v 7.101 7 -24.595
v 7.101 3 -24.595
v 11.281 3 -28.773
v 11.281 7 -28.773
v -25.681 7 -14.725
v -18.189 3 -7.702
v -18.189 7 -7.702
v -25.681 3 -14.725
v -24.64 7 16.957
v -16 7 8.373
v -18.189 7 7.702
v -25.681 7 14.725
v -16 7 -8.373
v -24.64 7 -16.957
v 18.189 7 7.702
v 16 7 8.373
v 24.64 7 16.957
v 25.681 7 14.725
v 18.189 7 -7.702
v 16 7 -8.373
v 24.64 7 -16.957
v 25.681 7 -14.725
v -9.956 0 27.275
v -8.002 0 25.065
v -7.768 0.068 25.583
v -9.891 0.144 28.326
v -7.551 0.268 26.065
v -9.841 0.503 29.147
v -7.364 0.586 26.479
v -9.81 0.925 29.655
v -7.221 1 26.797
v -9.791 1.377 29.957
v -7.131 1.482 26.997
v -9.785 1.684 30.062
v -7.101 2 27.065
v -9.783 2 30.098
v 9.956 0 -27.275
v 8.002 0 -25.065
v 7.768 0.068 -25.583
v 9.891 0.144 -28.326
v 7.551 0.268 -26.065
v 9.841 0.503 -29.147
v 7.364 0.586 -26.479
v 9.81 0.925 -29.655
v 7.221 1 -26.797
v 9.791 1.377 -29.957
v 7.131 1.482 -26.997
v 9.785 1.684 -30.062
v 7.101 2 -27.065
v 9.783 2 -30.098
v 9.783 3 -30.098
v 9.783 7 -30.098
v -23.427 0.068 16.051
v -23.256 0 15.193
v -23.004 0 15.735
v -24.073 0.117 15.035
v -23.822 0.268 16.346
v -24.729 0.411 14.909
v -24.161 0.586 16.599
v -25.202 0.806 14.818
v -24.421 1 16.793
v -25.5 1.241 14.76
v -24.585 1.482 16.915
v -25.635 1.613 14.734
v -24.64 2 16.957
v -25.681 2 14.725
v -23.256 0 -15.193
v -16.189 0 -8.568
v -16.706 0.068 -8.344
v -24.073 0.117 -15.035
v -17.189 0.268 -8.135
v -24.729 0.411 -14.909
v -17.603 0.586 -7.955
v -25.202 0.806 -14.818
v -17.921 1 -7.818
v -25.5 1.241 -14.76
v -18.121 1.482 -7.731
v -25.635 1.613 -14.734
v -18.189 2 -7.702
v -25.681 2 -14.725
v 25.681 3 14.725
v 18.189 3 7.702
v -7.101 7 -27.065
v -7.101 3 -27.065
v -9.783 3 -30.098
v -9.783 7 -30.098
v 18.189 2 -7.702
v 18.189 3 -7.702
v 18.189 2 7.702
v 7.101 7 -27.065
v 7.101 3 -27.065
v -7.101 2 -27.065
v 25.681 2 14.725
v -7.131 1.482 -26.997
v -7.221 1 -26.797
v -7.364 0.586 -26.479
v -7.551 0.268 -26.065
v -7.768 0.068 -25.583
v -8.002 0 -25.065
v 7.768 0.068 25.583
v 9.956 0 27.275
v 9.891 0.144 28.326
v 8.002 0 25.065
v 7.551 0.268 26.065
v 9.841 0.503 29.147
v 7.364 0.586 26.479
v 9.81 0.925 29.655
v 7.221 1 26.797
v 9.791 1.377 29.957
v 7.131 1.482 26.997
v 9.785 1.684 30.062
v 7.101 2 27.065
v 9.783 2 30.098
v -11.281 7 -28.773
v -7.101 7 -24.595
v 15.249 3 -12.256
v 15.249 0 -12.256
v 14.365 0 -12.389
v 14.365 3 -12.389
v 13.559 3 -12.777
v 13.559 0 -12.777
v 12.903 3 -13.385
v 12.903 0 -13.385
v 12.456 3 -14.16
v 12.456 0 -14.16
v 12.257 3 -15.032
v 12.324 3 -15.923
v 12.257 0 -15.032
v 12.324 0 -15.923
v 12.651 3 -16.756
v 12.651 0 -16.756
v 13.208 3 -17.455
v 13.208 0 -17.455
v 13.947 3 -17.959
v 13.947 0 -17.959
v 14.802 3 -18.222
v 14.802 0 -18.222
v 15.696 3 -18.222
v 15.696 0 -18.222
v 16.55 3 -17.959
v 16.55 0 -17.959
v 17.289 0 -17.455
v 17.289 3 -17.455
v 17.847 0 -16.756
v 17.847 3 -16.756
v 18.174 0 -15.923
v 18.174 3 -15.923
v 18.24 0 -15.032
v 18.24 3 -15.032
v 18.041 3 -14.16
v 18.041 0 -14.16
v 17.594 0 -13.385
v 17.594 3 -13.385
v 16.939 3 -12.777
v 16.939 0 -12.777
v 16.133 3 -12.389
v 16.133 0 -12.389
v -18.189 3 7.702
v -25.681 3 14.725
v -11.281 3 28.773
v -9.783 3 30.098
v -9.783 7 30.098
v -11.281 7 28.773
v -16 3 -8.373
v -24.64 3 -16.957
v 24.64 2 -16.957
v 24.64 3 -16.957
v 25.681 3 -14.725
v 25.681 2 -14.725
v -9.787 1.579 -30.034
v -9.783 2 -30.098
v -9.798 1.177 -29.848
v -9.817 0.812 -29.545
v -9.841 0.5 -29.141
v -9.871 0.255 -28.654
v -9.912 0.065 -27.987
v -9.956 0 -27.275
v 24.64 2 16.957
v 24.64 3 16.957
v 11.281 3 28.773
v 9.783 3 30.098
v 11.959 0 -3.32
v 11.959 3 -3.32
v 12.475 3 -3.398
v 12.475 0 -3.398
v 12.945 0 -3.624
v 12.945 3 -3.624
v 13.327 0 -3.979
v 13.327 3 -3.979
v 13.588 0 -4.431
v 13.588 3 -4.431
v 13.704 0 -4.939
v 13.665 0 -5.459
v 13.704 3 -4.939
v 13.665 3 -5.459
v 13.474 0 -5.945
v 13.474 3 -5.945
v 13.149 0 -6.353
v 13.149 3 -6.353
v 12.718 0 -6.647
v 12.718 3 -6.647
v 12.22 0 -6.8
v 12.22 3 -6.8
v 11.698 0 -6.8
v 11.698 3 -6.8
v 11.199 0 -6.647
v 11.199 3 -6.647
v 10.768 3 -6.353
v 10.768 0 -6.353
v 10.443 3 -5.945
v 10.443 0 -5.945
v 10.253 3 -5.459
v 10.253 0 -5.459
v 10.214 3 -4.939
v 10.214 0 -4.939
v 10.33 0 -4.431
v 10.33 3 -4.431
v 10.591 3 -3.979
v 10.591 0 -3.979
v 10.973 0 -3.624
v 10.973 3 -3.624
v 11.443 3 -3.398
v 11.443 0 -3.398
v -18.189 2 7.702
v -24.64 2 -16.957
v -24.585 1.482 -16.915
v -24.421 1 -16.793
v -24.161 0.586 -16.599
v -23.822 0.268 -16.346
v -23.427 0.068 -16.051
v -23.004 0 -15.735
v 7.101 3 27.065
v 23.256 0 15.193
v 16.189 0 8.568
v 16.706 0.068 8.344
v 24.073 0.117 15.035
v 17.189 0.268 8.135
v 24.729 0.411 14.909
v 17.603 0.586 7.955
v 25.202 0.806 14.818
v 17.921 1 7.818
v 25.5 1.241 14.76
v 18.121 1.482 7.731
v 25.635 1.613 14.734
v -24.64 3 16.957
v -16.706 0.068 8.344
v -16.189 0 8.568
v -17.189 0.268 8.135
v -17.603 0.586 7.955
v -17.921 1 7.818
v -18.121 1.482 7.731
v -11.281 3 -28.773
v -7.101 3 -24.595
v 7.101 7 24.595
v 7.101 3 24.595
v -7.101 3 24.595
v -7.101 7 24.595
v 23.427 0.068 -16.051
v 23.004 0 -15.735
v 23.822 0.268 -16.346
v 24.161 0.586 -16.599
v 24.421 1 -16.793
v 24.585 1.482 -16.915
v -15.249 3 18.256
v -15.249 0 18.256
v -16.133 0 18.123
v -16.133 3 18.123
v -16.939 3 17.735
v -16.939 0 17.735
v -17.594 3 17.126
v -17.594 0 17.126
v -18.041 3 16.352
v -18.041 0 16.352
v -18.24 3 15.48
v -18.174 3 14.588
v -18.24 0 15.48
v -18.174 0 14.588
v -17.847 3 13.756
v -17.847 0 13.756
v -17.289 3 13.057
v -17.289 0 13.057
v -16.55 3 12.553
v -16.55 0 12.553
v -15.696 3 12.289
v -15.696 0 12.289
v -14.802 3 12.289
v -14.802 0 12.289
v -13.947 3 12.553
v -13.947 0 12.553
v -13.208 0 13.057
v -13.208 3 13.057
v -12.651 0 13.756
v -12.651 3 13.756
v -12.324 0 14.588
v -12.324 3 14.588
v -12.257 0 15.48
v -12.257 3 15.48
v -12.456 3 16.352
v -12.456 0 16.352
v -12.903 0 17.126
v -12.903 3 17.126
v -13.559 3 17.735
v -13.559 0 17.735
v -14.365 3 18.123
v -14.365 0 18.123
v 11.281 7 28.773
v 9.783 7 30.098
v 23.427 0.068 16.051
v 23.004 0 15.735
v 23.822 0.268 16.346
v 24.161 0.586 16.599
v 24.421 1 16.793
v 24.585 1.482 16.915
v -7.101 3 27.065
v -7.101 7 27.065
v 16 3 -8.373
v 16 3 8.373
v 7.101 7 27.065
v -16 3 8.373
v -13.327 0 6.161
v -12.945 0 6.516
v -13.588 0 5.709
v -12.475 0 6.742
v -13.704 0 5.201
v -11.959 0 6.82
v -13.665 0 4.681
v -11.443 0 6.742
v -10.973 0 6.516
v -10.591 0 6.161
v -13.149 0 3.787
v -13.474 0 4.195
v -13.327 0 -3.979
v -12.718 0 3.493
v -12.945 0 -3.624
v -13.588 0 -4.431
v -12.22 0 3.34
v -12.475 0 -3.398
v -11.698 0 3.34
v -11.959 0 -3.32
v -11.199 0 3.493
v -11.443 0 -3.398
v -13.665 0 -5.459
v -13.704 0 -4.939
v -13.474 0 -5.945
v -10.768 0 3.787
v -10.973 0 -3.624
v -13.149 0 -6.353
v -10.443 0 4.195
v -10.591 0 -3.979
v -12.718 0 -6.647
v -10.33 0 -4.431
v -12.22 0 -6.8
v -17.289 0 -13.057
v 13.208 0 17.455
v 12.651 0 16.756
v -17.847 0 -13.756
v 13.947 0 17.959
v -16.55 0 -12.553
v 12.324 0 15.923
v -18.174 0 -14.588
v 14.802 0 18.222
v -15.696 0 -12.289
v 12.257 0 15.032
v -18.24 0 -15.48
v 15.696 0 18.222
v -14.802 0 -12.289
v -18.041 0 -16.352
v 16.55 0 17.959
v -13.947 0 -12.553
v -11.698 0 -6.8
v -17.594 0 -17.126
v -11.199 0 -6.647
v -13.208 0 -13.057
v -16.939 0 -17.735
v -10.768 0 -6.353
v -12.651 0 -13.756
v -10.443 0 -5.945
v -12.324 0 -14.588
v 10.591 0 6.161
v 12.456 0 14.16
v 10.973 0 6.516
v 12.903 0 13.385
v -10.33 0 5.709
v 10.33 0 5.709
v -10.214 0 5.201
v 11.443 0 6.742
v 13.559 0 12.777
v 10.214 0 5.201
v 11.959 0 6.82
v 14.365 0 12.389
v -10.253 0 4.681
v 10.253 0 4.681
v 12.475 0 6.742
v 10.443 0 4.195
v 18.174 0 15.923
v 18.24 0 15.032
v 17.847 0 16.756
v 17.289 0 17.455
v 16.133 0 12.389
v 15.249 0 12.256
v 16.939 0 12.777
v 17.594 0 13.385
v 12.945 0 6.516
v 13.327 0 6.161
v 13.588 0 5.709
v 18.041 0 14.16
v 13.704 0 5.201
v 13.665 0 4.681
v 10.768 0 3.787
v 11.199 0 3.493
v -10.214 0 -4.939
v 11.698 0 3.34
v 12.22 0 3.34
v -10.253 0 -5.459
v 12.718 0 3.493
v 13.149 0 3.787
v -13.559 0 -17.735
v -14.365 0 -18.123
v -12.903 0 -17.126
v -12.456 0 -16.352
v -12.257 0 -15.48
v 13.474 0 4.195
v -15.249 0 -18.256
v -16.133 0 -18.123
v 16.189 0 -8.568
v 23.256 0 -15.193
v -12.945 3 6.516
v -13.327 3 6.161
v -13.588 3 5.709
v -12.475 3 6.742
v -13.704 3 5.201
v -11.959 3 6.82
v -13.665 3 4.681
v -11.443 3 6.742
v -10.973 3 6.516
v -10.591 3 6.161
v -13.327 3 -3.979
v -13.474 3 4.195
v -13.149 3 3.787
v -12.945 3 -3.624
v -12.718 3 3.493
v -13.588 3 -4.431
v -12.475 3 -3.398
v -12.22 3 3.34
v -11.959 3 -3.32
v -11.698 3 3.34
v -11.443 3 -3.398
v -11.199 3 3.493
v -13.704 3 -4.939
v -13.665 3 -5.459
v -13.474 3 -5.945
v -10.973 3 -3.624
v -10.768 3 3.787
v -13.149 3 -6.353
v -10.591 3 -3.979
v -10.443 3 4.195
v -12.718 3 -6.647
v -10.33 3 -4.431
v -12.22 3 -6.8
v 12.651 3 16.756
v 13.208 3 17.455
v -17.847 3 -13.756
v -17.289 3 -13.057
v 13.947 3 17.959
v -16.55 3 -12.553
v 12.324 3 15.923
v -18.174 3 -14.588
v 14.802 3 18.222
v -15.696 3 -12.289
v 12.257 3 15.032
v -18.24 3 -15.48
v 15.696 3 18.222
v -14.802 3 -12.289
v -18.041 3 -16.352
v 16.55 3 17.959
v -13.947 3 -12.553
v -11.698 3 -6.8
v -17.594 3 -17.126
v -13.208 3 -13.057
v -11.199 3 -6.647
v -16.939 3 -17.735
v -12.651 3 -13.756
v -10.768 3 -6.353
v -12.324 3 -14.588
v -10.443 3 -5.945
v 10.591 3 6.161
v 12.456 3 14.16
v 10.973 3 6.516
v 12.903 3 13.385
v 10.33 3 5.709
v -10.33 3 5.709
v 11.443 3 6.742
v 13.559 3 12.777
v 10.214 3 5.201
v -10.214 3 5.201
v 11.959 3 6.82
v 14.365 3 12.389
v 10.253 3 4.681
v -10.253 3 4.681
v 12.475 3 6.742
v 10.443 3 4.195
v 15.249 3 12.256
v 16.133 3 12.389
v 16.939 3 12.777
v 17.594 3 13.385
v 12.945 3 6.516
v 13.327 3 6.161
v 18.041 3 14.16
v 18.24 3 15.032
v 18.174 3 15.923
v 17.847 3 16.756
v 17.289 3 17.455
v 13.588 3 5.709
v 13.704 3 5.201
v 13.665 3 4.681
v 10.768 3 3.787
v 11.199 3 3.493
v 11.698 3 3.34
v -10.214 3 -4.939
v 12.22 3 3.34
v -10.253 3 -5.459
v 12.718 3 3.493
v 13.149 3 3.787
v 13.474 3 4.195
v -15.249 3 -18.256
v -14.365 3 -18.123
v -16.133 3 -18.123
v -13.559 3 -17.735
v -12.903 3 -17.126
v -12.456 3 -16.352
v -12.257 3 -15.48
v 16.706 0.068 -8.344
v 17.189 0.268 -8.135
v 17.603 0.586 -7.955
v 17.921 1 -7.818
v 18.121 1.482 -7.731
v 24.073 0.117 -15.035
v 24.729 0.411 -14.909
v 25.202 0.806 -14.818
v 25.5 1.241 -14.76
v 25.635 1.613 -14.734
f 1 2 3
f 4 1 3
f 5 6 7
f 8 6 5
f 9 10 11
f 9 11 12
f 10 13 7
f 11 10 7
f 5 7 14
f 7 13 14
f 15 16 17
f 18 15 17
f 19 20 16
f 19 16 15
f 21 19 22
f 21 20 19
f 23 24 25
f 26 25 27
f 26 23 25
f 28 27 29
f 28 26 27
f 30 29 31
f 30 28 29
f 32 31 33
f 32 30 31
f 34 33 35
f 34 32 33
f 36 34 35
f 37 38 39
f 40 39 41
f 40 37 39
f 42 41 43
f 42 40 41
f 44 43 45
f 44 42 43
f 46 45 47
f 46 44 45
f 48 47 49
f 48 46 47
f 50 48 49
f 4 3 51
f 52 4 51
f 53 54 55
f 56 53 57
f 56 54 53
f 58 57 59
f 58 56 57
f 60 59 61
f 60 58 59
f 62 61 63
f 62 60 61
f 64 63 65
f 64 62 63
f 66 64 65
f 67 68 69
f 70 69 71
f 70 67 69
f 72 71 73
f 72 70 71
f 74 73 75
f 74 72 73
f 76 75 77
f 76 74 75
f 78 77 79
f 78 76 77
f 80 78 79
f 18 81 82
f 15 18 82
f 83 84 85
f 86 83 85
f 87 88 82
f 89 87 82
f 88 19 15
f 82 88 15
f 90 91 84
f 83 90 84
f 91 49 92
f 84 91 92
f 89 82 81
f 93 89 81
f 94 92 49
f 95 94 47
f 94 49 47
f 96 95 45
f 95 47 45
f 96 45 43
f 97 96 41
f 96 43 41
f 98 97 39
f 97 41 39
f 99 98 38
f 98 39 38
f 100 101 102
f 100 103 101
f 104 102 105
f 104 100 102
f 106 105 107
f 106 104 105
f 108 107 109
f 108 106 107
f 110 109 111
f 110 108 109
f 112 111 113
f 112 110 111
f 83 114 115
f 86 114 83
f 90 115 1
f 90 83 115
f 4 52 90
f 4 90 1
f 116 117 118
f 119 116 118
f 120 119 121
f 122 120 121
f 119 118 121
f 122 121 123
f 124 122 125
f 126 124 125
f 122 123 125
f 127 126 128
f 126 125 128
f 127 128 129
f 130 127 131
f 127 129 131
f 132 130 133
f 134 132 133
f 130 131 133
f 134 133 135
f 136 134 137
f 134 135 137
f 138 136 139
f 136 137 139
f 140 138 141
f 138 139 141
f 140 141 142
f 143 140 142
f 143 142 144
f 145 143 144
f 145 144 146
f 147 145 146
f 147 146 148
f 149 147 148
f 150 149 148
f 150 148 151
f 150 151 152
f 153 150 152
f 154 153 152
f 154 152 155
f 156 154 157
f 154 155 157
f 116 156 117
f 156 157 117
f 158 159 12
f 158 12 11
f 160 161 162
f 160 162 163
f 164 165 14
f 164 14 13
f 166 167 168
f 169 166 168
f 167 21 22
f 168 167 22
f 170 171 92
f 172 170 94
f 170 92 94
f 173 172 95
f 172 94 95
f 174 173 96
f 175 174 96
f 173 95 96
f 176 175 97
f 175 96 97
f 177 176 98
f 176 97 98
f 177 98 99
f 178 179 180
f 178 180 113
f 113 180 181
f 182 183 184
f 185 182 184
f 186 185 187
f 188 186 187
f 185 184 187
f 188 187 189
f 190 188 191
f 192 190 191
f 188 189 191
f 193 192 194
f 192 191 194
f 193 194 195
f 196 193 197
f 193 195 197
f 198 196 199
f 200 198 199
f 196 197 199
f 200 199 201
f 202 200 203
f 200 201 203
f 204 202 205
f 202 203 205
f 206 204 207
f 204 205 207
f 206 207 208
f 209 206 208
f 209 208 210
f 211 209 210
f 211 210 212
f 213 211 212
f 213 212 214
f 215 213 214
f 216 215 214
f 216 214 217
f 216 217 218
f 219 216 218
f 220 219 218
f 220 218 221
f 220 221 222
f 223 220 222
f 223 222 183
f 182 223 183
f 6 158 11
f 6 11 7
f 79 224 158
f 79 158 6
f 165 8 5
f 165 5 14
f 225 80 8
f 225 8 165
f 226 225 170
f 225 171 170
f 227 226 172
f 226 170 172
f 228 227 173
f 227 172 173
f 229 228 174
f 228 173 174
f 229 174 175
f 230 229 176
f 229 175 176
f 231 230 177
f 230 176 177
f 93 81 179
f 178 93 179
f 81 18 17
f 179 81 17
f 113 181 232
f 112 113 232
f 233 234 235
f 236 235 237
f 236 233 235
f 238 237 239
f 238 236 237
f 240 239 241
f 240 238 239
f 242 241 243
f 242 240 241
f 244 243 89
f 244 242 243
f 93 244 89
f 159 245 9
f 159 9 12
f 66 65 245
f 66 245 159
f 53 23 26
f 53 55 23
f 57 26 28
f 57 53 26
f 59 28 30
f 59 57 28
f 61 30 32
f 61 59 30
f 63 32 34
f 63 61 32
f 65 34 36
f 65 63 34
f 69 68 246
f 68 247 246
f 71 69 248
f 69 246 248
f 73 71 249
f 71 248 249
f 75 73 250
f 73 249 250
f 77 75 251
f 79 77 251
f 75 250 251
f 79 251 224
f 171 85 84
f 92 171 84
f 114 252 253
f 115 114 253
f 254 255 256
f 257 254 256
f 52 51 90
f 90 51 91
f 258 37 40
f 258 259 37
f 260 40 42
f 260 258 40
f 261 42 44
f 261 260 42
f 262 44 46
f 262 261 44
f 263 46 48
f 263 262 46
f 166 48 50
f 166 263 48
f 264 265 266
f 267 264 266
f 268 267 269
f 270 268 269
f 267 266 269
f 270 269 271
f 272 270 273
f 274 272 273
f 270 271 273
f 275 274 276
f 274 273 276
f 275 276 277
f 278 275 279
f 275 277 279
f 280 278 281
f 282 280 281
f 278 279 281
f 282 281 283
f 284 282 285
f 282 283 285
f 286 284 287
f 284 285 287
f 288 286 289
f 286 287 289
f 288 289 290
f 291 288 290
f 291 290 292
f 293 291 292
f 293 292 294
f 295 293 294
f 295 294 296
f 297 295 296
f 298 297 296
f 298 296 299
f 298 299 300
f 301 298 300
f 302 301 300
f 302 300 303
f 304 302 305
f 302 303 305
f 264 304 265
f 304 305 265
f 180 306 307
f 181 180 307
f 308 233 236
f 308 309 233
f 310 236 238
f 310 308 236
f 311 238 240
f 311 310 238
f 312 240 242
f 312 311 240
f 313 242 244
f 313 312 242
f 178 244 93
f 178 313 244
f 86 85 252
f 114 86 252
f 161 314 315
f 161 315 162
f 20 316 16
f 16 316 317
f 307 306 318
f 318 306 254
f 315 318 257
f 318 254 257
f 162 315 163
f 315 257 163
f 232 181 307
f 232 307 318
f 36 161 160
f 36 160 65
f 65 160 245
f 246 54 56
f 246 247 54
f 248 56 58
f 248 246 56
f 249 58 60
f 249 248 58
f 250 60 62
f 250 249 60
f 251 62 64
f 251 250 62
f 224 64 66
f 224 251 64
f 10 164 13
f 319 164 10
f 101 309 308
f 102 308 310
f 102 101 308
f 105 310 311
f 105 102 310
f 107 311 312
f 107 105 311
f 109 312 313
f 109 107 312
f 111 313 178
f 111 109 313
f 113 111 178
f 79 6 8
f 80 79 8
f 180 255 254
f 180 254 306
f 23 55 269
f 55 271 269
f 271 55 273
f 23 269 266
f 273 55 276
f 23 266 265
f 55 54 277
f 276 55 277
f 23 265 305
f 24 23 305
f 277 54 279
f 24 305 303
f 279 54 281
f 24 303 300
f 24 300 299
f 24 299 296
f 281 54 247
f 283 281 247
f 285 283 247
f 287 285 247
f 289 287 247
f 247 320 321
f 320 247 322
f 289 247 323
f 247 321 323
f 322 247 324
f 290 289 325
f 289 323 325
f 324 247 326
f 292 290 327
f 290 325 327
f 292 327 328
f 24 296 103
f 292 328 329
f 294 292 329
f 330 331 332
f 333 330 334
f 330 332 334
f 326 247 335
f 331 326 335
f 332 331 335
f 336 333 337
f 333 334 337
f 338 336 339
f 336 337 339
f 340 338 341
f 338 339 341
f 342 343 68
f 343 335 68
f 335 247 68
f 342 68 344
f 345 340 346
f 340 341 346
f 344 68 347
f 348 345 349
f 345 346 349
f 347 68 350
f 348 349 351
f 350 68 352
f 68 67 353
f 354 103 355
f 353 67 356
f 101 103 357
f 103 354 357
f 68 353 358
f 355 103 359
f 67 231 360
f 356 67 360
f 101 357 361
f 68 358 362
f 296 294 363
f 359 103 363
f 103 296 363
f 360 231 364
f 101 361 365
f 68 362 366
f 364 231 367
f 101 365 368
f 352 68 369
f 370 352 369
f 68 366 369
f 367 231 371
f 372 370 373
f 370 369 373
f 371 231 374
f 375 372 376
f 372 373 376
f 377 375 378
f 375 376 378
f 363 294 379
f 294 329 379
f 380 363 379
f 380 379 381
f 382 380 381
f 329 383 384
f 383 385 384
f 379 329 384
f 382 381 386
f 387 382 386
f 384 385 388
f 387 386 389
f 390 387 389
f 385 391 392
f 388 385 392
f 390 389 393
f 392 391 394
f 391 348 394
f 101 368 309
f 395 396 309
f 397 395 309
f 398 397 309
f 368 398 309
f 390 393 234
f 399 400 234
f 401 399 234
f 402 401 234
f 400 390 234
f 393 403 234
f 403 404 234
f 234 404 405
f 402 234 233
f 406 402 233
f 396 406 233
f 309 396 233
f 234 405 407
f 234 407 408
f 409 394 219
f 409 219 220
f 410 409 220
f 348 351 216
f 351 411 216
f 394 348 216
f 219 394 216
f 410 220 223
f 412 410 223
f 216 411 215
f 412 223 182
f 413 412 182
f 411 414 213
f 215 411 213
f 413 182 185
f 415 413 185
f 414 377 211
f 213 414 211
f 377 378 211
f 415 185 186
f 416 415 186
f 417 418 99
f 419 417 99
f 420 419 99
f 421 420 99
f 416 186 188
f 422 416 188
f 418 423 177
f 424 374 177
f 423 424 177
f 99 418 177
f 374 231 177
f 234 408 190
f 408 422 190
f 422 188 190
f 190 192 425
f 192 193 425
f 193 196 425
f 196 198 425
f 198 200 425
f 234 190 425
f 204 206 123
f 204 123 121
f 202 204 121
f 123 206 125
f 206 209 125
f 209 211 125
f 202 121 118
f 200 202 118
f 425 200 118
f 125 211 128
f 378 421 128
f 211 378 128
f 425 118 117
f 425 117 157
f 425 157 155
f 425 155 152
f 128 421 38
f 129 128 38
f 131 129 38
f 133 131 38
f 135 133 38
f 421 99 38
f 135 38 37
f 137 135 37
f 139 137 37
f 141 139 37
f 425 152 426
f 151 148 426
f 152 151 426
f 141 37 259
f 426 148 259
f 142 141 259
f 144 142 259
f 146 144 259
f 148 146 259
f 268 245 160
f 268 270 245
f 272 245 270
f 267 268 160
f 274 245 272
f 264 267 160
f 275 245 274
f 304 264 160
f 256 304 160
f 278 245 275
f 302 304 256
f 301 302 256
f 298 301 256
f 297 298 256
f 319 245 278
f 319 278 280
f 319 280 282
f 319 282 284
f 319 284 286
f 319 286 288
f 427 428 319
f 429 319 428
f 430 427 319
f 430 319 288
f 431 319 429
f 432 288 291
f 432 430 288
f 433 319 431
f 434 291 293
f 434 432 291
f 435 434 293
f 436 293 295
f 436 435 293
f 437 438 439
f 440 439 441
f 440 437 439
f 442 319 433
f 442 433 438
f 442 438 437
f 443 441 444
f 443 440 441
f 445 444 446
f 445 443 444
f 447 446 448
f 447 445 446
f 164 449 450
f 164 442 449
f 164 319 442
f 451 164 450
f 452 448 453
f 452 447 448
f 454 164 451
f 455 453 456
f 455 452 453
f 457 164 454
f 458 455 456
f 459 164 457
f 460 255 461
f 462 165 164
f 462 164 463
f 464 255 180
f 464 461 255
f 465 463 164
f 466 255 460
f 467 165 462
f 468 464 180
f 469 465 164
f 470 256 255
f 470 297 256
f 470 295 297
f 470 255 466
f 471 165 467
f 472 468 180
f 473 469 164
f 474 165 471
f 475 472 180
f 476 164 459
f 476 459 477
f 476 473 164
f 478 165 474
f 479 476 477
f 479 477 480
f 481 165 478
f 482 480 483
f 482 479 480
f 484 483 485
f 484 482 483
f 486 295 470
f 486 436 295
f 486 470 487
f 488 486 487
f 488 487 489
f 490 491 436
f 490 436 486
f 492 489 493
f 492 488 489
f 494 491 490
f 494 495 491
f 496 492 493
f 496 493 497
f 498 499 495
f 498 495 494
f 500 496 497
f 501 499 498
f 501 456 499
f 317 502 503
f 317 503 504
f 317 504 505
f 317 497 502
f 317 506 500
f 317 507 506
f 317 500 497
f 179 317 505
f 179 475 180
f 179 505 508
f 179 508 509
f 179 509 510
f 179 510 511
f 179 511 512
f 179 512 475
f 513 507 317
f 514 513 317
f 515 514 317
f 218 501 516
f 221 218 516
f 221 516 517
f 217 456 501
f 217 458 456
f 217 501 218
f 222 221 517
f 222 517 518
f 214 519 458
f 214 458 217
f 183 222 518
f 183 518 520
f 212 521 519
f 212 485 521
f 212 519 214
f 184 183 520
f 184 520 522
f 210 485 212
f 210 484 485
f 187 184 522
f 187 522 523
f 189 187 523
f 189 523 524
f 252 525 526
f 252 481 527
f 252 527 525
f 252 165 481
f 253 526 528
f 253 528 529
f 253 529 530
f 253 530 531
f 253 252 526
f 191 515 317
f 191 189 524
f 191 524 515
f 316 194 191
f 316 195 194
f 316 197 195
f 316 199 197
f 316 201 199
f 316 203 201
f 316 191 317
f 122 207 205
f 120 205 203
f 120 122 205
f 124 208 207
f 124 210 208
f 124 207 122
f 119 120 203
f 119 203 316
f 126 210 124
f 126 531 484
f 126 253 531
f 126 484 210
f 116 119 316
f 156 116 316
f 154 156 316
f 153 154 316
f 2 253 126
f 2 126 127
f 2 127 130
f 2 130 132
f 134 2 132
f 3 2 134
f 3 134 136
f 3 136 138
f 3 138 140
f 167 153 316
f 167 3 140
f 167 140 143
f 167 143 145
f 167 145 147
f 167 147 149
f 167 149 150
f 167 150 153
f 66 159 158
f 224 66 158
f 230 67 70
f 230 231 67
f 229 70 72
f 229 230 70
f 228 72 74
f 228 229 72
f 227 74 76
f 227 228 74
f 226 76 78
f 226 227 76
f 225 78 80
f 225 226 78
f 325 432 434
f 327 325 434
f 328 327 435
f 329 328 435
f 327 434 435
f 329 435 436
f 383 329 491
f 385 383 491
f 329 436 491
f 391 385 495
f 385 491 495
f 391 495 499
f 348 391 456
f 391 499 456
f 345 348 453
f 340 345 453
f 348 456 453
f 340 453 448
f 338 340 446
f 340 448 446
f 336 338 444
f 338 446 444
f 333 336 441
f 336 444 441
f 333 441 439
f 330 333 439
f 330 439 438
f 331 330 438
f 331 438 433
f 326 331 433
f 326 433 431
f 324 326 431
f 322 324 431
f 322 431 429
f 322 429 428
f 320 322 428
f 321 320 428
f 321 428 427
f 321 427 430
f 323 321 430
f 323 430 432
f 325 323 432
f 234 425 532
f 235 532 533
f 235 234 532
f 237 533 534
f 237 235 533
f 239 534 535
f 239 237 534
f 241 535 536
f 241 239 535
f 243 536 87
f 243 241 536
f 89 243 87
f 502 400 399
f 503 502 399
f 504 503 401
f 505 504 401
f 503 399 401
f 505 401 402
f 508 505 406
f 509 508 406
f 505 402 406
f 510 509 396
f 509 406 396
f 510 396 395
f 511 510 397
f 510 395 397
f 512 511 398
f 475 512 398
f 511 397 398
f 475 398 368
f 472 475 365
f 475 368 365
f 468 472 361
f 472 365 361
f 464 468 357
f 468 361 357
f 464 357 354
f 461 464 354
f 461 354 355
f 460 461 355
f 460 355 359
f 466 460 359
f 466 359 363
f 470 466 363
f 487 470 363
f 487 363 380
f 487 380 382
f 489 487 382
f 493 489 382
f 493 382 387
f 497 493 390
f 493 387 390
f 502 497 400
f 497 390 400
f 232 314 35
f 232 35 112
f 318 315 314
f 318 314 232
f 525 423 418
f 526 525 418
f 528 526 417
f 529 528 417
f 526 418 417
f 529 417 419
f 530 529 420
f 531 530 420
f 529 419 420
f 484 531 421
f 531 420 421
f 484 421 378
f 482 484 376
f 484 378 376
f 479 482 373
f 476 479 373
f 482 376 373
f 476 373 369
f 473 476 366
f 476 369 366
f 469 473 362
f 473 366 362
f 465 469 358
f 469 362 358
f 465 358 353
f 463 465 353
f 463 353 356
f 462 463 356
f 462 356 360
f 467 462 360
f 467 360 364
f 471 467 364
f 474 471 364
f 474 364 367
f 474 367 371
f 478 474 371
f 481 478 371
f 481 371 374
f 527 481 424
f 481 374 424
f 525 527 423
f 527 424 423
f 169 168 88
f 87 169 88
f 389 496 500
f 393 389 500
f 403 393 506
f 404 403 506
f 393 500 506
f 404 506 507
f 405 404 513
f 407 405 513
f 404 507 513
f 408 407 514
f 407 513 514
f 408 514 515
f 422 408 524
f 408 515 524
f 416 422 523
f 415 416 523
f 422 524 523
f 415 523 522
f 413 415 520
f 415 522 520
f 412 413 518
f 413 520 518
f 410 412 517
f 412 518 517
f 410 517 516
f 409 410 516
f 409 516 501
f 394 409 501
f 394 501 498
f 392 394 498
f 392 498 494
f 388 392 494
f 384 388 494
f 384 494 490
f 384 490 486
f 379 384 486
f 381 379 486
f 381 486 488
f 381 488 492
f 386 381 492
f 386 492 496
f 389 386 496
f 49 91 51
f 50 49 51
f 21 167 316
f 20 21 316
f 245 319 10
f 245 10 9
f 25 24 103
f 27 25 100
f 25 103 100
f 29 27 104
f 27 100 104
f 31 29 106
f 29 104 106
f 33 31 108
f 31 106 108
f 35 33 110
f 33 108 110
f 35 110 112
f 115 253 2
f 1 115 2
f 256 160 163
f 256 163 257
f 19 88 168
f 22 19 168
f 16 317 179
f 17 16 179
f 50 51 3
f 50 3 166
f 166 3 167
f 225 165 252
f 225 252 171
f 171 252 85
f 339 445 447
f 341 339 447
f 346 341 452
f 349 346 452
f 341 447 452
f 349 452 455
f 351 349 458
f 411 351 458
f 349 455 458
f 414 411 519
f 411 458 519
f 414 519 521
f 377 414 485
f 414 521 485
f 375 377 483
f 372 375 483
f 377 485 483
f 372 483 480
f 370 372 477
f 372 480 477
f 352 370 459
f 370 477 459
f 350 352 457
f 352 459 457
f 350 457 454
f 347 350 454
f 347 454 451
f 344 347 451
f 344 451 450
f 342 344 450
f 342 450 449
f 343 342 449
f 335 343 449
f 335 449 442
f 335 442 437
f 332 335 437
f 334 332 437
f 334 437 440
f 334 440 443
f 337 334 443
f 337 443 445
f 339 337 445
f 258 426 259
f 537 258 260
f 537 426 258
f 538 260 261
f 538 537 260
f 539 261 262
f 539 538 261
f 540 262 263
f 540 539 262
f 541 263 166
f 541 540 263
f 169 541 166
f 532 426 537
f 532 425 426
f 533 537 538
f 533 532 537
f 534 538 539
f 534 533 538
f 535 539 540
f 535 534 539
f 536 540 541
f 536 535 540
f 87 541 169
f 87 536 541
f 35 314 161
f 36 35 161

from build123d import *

# Parameters (mm, degrees)
SKETCH1_W           = 55
SKETCH1_H           = 64.43
BOSS_EXTRUDE1_DEPTH = 3
CUT_EXTRUDE1_DEPTH  = 4
SKETCH3_OUTSIDE_W   = 73.954
SKETCH3_OUTSIDE_H   = 83.384
CUT_EXTRUDE4_DEPTH  = 4
BOSS_EXTRUDE2_DEPTH = 3
BOSS_EXTRUDE3_DEPTH = 3
BOSS_EXTRUDE4_DEPTH = 4
BOSS_EXTRUDE5_DEPTH = 4
FILLET1_R           = 2
SKETCH9_R           = 1.75
CUT_EXTRUDE6_DEPTH  = 40.766745199
SKETCH10_R          = 3
CUT_EXTRUDE7_DEPTH  = 3
SKETCH11_R          = 1.75
CUT_EXTRUDE8_DEPTH  = 40.766745199


with BuildPart() as part:
    # Sketch1 → Boss-Extrude1 (new body)
    with BuildSketch(Plane(origin=(0, 0, 0), x_dir=(1, 0, 0), z_dir=(0, 1, 0))):
        Rectangle(SKETCH1_W, SKETCH1_H)
    extrude(amount=BOSS_EXTRUDE1_DEPTH)

    # Sketch2 → Cut-Extrude1 (cut)
    with BuildSketch(Plane(origin=(0, 3, 0), x_dir=(1, 0, 0), z_dir=(0, 1, 0))):
        Polygon((-27.5, -4.791277462), (-27.5, -14.373832386), (-17.5, -5), (-17.5, 5), (-27.5, 14.373832386), (-27.5, 4.791277462), align=None)
        Polygon((27.5, 4.791277462), (27.5, 14.373832386), (17.5, 5), (17.5, -5), (27.5, -14.373832386), (27.5, -4.791277462), align=None)
    extrude(amount=-CUT_EXTRUDE1_DEPTH, mode=Mode.SUBTRACT)

    # Sketch3 outside → Cut-Extrude4 (cut)
    with BuildSketch(Plane(origin=(0, 3, 0), x_dir=(1, 0, 0), z_dir=(0, 1, 0))):
        Rectangle(SKETCH3_OUTSIDE_W, SKETCH3_OUTSIDE_H)
        Polygon((-16, -5.649903378), (-16, 0), (-16, 5.649903378), (-25.681219861, 14.724916605), (-24.640371834, 16.957022404), (-9.782767538, 30.09765722), (-4.418267546, 24.032225889), (4.418267546, 24.032225889), (9.782767538, 30.09765722), (24.640371834, 16.957022404), (25.681219861, 14.724916605), (16, 5.649903378), (16, -5.649903378), (25.681219861, -14.724916605), (24.640371834, -16.957022404), (9.782767538, -30.09765722), (4.418267546, -24.032225889), (-4.418267546, -24.032225889), (-9.782767538, -30.09765722), (-24.640371834, -16.957022404), (-25.681219861, -14.724916605), align=None, mode=Mode.SUBTRACT)
    extrude(amount=-CUT_EXTRUDE4_DEPTH, mode=Mode.SUBTRACT)

    # Sketch4 → Boss-Extrude2 (add)
    with BuildSketch(Plane(origin=(0, 3, 0), x_dir=(1, 0, 0), z_dir=(0, 1, 0))):
        Polygon((-7.100517542, 27.064941555), (7.100517542, 27.064941555), (4.418267546, 24.032225889), (-4.418267546, 24.032225889), align=None)
        Polygon((-7.100517542, -27.064941555), (7.100517542, -27.064941555), (4.418267546, -24.032225889), (-4.418267546, -24.032225889), align=None)
    extrude(amount=-BOSS_EXTRUDE2_DEPTH)

    # Sketch5 → Boss-Extrude3 (add)
    with BuildSketch(Plane(origin=(0, 3, 0), x_dir=(1, 0, 0), z_dir=(0, 1, 0))):
        Polygon((-16, 5.649903378), (-18.188739123, 7.701590745), (-18.188739123, -7.701590745), (-16, -5.649903378), align=None)
        Polygon((16, 5.649903378), (18.188739123, 7.701590745), (18.188739123, -7.701590745), (16, -5.649903378), align=None)
    extrude(amount=-BOSS_EXTRUDE3_DEPTH)

    # Sketch6 → Boss-Extrude4 (add)
    with BuildSketch(Plane(origin=(0, 3, 0), x_dir=(1, 0, 0), z_dir=(0, 1, 0))):
        Polygon((-24.640371834, -16.957022404), (-25.681219861, -14.724916605), (-18.188739123, -7.701590745), (-18.188739123, 7.701590745), (-25.681219861, 14.724916605), (-24.640371834, 16.957022404), (-16, 8.373408054), (-16, -8.373408054), align=None)
        Polygon((16, -8.373408054), (24.640371834, -16.957022404), (25.681219861, -14.724916605), (18.188739123, -7.701590745), (18.188739123, 7.701590745), (25.681219861, 14.724916605), (24.640371834, 16.957022404), (16, 8.373408054), align=None)
    extrude(amount=BOSS_EXTRUDE4_DEPTH)

    # Sketch7 → Boss-Extrude5 (add)
    with BuildSketch(Plane(origin=(0, 3, 0), x_dir=(1, 0, 0), z_dir=(0, 1, 0))):
        Polygon((-1, 27.064941555), (-7.100517542, 27.064941555), (-9.782767538, 30.09765722), (-11.280892286, 28.772658262), (-7.100517542, 24.594941555), (-1, 24.594941555), (1, 24.594941555), (7.100517542, 24.594941555), (11.280892286, 28.772658262), (9.782767538, 30.09765722), (7.100517542, 27.064941555), (1, 27.064941555), align=None)
        Polygon((-1, -27.064941555), (-7.100517542, -27.064941555), (-9.782767538, -30.09765722), (-11.280892286, -28.772658262), (-7.100517542, -24.594941555), (-1, -24.594941555), (1, -24.594941555), (7.100517542, -24.594941555), (11.280892286, -28.772658262), (9.782767538, -30.09765722), (7.100517542, -27.064941555), (1, -27.064941555), align=None)
    extrude(amount=BOSS_EXTRUDE5_DEPTH)

    # Fillet1
    fillet1_edges = [part.edges().sort_by_distance(p)[0] for p in [
        (0, 0, -27.064941555),
        (0, 0, 27.064941555),
        (-21.934979492, 0, 11.213253675),
        (-21.934979492, 0, -11.213253675),
        (21.934979492, 0, -11.213253675),
        (21.934979492, 0, 11.213253675),
        (-18.188739123, 0, 0),
        (18.188739123, 0, 0),
        (-25.160795848, 0, 15.840969504),
        (-17.211569686, 0, 23.527339812),
        (-8.44164254, 0, 28.581299387),
        (8.44164254, 0, 28.581299387),
        (17.211569686, 0, 23.527339812),
        (25.160795848, 0, 15.840969504),
        (25.160795848, 0, -15.840969504),
        (17.211569686, 0, -23.527339812),
        (8.44164254, 0, -28.581299387),
        (-8.44164254, 0, -28.581299387),
        (-17.211569686, 0, -23.527339812),
        (-25.160795848, 0, -15.840969504),
    ]]
    fillet(fillet1_edges, radius=FILLET1_R)

    # Sketch9 → Cut-Extrude6 (cut, through all)
    with BuildSketch(Plane(origin=(0, 3, 0), x_dir=(1, 0, 0), z_dir=(0, 1, 0))):
        with Locations(Location((15.251219861, -15.244152763, 0), (0, 0, 270))):
            Circle(SKETCH9_R)
        with Locations(Location((15.251219861, 15.255847237, 0), (0, 0, 270))):
            Circle(SKETCH9_R)
        with Locations(Location((-15.248780139, 15.255847237, 0), (0, 0, 270))):
            Circle(SKETCH9_R)
        with Locations(Location((-15.248780139, -15.244152763, 0), (0, 0, 270))):
            Circle(SKETCH9_R)
    extrude(amount=-CUT_EXTRUDE6_DEPTH, mode=Mode.SUBTRACT)

    # Sketch10 → Cut-Extrude7 (cut)
    with BuildSketch(Plane.XZ):
        with Locations(Location((-15.248780139, -15.255847237, 0), (0, 0, 270))):
            Circle(SKETCH10_R)
        with Locations(Location((-15.248780139, 15.255847237, 0), (0, 0, 90))):
            Circle(SKETCH10_R)
        with Locations(Location((15.248780139, -15.255847237, 0), (0, 0, 90))):
            Circle(SKETCH10_R)
        with Locations(Location((15.248780139, 15.255847237, 0), (0, 0, 270))):
            Circle(SKETCH10_R)
    extrude(amount=-CUT_EXTRUDE7_DEPTH, mode=Mode.SUBTRACT)

    # Sketch11 → Cut-Extrude8 (cut, through all)
    with BuildSketch(Plane(origin=(0, 3, 0), x_dir=(1, 0, 0), z_dir=(0, 1, 0))):
        with Locations(Location((11.958739123, -5.07, 0), (0, 0, 270))):
            Circle(SKETCH11_R)
        with Locations(Location((11.958739123, 5.07, 0), (0, 0, 270))):
            Circle(SKETCH11_R)
        with Locations(Location((-11.958739123, -5.07, 0), (0, 0, 270))):
            Circle(SKETCH11_R)
        with Locations(Location((-11.958739123, 5.07, 0), (0, 0, 270))):
            Circle(SKETCH11_R)
    extrude(amount=-CUT_EXTRUDE8_DEPTH, mode=Mode.SUBTRACT)


solid = part.part
